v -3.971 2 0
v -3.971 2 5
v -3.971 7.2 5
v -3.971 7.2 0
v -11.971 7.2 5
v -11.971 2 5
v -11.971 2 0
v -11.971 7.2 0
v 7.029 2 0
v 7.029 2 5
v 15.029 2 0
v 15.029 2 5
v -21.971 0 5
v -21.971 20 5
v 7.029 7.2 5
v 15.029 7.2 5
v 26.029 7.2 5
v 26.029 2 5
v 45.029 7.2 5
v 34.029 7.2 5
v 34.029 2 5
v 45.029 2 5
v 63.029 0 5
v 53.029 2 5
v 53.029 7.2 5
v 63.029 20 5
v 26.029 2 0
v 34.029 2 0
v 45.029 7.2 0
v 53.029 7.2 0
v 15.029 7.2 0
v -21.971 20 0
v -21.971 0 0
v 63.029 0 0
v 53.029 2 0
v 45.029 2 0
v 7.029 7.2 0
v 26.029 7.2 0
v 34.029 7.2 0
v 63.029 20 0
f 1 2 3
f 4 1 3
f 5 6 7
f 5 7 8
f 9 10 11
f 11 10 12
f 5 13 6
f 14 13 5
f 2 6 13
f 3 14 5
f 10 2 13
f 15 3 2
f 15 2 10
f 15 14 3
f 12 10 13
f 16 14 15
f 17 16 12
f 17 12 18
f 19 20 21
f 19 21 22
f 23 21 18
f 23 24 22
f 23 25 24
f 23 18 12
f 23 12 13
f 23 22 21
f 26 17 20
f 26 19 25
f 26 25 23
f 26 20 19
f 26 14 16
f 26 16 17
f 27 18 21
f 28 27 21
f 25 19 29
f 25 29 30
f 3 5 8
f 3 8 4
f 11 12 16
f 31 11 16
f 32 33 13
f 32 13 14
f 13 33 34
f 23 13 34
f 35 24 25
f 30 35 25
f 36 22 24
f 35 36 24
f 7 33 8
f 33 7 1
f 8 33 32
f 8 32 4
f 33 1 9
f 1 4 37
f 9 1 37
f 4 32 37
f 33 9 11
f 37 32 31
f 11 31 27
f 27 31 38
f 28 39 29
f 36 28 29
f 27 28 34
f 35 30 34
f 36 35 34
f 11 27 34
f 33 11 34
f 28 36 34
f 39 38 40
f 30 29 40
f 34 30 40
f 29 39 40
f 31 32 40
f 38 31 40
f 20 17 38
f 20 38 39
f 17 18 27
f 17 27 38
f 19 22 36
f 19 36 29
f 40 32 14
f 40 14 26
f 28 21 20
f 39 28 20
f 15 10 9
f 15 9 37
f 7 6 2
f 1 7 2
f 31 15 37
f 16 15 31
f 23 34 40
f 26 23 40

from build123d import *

# Parameters (mm, degrees)
SKETCH1_W           = 85
SKETCH1_H           = 20
BOSS_EXTRUDE1_DEPTH = 5
CUT_EXTRUDE1_REACH  = 7
SKETCH2_W           = 8
SKETCH2_H           = 5.2


with BuildPart() as part:
    # Sketch1 → Boss-Extrude1 (new body)
    with BuildSketch(Plane.XY):
        with Locations((20.528766582, 10)):
            Rectangle(SKETCH1_W, SKETCH1_H)
    extrude(amount=BOSS_EXTRUDE1_DEPTH)

    # Sketch2 → Cut-Extrude1 (cut, up to next)
    with BuildSketch(Plane.XY.offset(5), mode=Mode.PRIVATE) as cut_extrude1_sk1:
        with Locations((-7.971233418, 4.6)):
            Rectangle(SKETCH2_W, SKETCH2_H)
    cut_extrude1_tool1 = extrude(cut_extrude1_sk1.sketch, amount=-CUT_EXTRUDE1_REACH, mode=Mode.PRIVATE) & part.part
    add(cut_extrude1_tool1.solids().sort_by_distance((-7.971233, 4.6, 5))[0], mode=Mode.SUBTRACT)
    # Sketch2 → Cut-Extrude1 (cut, up to next)
    with BuildSketch(Plane.XY.offset(5), mode=Mode.PRIVATE) as cut_extrude1_sk2:
        with Locations((11.028766582, 4.6)):
            Rectangle(SKETCH2_W, SKETCH2_H)
    cut_extrude1_tool2 = extrude(cut_extrude1_sk2.sketch, amount=-CUT_EXTRUDE1_REACH, mode=Mode.PRIVATE) & part.part
    add(cut_extrude1_tool2.solids().sort_by_distance((11.028767, 4.6, 5))[0], mode=Mode.SUBTRACT)
    # Sketch2 → Cut-Extrude1 (cut, up to next)
    with BuildSketch(Plane.XY.offset(5), mode=Mode.PRIVATE) as cut_extrude1_sk3:
        with Locations((30.028766582, 4.6)):
            Rectangle(SKETCH2_W, SKETCH2_H)
    cut_extrude1_tool3 = extrude(cut_extrude1_sk3.sketch, amount=-CUT_EXTRUDE1_REACH, mode=Mode.PRIVATE) & part.part
    add(cut_extrude1_tool3.solids().sort_by_distance((30.028767, 4.6, 5))[0], mode=Mode.SUBTRACT)
    # Sketch2 → Cut-Extrude1 (cut, up to next)
    with BuildSketch(Plane.XY.offset(5), mode=Mode.PRIVATE) as cut_extrude1_sk4:
        with Locations((49.028766582, 4.6)):
            Rectangle(SKETCH2_W, SKETCH2_H)
    cut_extrude1_tool4 = extrude(cut_extrude1_sk4.sketch, amount=-CUT_EXTRUDE1_REACH, mode=Mode.PRIVATE) & part.part
    add(cut_extrude1_tool4.solids().sort_by_distance((49.028767, 4.6, 5))[0], mode=Mode.SUBTRACT)


solid = part.part
